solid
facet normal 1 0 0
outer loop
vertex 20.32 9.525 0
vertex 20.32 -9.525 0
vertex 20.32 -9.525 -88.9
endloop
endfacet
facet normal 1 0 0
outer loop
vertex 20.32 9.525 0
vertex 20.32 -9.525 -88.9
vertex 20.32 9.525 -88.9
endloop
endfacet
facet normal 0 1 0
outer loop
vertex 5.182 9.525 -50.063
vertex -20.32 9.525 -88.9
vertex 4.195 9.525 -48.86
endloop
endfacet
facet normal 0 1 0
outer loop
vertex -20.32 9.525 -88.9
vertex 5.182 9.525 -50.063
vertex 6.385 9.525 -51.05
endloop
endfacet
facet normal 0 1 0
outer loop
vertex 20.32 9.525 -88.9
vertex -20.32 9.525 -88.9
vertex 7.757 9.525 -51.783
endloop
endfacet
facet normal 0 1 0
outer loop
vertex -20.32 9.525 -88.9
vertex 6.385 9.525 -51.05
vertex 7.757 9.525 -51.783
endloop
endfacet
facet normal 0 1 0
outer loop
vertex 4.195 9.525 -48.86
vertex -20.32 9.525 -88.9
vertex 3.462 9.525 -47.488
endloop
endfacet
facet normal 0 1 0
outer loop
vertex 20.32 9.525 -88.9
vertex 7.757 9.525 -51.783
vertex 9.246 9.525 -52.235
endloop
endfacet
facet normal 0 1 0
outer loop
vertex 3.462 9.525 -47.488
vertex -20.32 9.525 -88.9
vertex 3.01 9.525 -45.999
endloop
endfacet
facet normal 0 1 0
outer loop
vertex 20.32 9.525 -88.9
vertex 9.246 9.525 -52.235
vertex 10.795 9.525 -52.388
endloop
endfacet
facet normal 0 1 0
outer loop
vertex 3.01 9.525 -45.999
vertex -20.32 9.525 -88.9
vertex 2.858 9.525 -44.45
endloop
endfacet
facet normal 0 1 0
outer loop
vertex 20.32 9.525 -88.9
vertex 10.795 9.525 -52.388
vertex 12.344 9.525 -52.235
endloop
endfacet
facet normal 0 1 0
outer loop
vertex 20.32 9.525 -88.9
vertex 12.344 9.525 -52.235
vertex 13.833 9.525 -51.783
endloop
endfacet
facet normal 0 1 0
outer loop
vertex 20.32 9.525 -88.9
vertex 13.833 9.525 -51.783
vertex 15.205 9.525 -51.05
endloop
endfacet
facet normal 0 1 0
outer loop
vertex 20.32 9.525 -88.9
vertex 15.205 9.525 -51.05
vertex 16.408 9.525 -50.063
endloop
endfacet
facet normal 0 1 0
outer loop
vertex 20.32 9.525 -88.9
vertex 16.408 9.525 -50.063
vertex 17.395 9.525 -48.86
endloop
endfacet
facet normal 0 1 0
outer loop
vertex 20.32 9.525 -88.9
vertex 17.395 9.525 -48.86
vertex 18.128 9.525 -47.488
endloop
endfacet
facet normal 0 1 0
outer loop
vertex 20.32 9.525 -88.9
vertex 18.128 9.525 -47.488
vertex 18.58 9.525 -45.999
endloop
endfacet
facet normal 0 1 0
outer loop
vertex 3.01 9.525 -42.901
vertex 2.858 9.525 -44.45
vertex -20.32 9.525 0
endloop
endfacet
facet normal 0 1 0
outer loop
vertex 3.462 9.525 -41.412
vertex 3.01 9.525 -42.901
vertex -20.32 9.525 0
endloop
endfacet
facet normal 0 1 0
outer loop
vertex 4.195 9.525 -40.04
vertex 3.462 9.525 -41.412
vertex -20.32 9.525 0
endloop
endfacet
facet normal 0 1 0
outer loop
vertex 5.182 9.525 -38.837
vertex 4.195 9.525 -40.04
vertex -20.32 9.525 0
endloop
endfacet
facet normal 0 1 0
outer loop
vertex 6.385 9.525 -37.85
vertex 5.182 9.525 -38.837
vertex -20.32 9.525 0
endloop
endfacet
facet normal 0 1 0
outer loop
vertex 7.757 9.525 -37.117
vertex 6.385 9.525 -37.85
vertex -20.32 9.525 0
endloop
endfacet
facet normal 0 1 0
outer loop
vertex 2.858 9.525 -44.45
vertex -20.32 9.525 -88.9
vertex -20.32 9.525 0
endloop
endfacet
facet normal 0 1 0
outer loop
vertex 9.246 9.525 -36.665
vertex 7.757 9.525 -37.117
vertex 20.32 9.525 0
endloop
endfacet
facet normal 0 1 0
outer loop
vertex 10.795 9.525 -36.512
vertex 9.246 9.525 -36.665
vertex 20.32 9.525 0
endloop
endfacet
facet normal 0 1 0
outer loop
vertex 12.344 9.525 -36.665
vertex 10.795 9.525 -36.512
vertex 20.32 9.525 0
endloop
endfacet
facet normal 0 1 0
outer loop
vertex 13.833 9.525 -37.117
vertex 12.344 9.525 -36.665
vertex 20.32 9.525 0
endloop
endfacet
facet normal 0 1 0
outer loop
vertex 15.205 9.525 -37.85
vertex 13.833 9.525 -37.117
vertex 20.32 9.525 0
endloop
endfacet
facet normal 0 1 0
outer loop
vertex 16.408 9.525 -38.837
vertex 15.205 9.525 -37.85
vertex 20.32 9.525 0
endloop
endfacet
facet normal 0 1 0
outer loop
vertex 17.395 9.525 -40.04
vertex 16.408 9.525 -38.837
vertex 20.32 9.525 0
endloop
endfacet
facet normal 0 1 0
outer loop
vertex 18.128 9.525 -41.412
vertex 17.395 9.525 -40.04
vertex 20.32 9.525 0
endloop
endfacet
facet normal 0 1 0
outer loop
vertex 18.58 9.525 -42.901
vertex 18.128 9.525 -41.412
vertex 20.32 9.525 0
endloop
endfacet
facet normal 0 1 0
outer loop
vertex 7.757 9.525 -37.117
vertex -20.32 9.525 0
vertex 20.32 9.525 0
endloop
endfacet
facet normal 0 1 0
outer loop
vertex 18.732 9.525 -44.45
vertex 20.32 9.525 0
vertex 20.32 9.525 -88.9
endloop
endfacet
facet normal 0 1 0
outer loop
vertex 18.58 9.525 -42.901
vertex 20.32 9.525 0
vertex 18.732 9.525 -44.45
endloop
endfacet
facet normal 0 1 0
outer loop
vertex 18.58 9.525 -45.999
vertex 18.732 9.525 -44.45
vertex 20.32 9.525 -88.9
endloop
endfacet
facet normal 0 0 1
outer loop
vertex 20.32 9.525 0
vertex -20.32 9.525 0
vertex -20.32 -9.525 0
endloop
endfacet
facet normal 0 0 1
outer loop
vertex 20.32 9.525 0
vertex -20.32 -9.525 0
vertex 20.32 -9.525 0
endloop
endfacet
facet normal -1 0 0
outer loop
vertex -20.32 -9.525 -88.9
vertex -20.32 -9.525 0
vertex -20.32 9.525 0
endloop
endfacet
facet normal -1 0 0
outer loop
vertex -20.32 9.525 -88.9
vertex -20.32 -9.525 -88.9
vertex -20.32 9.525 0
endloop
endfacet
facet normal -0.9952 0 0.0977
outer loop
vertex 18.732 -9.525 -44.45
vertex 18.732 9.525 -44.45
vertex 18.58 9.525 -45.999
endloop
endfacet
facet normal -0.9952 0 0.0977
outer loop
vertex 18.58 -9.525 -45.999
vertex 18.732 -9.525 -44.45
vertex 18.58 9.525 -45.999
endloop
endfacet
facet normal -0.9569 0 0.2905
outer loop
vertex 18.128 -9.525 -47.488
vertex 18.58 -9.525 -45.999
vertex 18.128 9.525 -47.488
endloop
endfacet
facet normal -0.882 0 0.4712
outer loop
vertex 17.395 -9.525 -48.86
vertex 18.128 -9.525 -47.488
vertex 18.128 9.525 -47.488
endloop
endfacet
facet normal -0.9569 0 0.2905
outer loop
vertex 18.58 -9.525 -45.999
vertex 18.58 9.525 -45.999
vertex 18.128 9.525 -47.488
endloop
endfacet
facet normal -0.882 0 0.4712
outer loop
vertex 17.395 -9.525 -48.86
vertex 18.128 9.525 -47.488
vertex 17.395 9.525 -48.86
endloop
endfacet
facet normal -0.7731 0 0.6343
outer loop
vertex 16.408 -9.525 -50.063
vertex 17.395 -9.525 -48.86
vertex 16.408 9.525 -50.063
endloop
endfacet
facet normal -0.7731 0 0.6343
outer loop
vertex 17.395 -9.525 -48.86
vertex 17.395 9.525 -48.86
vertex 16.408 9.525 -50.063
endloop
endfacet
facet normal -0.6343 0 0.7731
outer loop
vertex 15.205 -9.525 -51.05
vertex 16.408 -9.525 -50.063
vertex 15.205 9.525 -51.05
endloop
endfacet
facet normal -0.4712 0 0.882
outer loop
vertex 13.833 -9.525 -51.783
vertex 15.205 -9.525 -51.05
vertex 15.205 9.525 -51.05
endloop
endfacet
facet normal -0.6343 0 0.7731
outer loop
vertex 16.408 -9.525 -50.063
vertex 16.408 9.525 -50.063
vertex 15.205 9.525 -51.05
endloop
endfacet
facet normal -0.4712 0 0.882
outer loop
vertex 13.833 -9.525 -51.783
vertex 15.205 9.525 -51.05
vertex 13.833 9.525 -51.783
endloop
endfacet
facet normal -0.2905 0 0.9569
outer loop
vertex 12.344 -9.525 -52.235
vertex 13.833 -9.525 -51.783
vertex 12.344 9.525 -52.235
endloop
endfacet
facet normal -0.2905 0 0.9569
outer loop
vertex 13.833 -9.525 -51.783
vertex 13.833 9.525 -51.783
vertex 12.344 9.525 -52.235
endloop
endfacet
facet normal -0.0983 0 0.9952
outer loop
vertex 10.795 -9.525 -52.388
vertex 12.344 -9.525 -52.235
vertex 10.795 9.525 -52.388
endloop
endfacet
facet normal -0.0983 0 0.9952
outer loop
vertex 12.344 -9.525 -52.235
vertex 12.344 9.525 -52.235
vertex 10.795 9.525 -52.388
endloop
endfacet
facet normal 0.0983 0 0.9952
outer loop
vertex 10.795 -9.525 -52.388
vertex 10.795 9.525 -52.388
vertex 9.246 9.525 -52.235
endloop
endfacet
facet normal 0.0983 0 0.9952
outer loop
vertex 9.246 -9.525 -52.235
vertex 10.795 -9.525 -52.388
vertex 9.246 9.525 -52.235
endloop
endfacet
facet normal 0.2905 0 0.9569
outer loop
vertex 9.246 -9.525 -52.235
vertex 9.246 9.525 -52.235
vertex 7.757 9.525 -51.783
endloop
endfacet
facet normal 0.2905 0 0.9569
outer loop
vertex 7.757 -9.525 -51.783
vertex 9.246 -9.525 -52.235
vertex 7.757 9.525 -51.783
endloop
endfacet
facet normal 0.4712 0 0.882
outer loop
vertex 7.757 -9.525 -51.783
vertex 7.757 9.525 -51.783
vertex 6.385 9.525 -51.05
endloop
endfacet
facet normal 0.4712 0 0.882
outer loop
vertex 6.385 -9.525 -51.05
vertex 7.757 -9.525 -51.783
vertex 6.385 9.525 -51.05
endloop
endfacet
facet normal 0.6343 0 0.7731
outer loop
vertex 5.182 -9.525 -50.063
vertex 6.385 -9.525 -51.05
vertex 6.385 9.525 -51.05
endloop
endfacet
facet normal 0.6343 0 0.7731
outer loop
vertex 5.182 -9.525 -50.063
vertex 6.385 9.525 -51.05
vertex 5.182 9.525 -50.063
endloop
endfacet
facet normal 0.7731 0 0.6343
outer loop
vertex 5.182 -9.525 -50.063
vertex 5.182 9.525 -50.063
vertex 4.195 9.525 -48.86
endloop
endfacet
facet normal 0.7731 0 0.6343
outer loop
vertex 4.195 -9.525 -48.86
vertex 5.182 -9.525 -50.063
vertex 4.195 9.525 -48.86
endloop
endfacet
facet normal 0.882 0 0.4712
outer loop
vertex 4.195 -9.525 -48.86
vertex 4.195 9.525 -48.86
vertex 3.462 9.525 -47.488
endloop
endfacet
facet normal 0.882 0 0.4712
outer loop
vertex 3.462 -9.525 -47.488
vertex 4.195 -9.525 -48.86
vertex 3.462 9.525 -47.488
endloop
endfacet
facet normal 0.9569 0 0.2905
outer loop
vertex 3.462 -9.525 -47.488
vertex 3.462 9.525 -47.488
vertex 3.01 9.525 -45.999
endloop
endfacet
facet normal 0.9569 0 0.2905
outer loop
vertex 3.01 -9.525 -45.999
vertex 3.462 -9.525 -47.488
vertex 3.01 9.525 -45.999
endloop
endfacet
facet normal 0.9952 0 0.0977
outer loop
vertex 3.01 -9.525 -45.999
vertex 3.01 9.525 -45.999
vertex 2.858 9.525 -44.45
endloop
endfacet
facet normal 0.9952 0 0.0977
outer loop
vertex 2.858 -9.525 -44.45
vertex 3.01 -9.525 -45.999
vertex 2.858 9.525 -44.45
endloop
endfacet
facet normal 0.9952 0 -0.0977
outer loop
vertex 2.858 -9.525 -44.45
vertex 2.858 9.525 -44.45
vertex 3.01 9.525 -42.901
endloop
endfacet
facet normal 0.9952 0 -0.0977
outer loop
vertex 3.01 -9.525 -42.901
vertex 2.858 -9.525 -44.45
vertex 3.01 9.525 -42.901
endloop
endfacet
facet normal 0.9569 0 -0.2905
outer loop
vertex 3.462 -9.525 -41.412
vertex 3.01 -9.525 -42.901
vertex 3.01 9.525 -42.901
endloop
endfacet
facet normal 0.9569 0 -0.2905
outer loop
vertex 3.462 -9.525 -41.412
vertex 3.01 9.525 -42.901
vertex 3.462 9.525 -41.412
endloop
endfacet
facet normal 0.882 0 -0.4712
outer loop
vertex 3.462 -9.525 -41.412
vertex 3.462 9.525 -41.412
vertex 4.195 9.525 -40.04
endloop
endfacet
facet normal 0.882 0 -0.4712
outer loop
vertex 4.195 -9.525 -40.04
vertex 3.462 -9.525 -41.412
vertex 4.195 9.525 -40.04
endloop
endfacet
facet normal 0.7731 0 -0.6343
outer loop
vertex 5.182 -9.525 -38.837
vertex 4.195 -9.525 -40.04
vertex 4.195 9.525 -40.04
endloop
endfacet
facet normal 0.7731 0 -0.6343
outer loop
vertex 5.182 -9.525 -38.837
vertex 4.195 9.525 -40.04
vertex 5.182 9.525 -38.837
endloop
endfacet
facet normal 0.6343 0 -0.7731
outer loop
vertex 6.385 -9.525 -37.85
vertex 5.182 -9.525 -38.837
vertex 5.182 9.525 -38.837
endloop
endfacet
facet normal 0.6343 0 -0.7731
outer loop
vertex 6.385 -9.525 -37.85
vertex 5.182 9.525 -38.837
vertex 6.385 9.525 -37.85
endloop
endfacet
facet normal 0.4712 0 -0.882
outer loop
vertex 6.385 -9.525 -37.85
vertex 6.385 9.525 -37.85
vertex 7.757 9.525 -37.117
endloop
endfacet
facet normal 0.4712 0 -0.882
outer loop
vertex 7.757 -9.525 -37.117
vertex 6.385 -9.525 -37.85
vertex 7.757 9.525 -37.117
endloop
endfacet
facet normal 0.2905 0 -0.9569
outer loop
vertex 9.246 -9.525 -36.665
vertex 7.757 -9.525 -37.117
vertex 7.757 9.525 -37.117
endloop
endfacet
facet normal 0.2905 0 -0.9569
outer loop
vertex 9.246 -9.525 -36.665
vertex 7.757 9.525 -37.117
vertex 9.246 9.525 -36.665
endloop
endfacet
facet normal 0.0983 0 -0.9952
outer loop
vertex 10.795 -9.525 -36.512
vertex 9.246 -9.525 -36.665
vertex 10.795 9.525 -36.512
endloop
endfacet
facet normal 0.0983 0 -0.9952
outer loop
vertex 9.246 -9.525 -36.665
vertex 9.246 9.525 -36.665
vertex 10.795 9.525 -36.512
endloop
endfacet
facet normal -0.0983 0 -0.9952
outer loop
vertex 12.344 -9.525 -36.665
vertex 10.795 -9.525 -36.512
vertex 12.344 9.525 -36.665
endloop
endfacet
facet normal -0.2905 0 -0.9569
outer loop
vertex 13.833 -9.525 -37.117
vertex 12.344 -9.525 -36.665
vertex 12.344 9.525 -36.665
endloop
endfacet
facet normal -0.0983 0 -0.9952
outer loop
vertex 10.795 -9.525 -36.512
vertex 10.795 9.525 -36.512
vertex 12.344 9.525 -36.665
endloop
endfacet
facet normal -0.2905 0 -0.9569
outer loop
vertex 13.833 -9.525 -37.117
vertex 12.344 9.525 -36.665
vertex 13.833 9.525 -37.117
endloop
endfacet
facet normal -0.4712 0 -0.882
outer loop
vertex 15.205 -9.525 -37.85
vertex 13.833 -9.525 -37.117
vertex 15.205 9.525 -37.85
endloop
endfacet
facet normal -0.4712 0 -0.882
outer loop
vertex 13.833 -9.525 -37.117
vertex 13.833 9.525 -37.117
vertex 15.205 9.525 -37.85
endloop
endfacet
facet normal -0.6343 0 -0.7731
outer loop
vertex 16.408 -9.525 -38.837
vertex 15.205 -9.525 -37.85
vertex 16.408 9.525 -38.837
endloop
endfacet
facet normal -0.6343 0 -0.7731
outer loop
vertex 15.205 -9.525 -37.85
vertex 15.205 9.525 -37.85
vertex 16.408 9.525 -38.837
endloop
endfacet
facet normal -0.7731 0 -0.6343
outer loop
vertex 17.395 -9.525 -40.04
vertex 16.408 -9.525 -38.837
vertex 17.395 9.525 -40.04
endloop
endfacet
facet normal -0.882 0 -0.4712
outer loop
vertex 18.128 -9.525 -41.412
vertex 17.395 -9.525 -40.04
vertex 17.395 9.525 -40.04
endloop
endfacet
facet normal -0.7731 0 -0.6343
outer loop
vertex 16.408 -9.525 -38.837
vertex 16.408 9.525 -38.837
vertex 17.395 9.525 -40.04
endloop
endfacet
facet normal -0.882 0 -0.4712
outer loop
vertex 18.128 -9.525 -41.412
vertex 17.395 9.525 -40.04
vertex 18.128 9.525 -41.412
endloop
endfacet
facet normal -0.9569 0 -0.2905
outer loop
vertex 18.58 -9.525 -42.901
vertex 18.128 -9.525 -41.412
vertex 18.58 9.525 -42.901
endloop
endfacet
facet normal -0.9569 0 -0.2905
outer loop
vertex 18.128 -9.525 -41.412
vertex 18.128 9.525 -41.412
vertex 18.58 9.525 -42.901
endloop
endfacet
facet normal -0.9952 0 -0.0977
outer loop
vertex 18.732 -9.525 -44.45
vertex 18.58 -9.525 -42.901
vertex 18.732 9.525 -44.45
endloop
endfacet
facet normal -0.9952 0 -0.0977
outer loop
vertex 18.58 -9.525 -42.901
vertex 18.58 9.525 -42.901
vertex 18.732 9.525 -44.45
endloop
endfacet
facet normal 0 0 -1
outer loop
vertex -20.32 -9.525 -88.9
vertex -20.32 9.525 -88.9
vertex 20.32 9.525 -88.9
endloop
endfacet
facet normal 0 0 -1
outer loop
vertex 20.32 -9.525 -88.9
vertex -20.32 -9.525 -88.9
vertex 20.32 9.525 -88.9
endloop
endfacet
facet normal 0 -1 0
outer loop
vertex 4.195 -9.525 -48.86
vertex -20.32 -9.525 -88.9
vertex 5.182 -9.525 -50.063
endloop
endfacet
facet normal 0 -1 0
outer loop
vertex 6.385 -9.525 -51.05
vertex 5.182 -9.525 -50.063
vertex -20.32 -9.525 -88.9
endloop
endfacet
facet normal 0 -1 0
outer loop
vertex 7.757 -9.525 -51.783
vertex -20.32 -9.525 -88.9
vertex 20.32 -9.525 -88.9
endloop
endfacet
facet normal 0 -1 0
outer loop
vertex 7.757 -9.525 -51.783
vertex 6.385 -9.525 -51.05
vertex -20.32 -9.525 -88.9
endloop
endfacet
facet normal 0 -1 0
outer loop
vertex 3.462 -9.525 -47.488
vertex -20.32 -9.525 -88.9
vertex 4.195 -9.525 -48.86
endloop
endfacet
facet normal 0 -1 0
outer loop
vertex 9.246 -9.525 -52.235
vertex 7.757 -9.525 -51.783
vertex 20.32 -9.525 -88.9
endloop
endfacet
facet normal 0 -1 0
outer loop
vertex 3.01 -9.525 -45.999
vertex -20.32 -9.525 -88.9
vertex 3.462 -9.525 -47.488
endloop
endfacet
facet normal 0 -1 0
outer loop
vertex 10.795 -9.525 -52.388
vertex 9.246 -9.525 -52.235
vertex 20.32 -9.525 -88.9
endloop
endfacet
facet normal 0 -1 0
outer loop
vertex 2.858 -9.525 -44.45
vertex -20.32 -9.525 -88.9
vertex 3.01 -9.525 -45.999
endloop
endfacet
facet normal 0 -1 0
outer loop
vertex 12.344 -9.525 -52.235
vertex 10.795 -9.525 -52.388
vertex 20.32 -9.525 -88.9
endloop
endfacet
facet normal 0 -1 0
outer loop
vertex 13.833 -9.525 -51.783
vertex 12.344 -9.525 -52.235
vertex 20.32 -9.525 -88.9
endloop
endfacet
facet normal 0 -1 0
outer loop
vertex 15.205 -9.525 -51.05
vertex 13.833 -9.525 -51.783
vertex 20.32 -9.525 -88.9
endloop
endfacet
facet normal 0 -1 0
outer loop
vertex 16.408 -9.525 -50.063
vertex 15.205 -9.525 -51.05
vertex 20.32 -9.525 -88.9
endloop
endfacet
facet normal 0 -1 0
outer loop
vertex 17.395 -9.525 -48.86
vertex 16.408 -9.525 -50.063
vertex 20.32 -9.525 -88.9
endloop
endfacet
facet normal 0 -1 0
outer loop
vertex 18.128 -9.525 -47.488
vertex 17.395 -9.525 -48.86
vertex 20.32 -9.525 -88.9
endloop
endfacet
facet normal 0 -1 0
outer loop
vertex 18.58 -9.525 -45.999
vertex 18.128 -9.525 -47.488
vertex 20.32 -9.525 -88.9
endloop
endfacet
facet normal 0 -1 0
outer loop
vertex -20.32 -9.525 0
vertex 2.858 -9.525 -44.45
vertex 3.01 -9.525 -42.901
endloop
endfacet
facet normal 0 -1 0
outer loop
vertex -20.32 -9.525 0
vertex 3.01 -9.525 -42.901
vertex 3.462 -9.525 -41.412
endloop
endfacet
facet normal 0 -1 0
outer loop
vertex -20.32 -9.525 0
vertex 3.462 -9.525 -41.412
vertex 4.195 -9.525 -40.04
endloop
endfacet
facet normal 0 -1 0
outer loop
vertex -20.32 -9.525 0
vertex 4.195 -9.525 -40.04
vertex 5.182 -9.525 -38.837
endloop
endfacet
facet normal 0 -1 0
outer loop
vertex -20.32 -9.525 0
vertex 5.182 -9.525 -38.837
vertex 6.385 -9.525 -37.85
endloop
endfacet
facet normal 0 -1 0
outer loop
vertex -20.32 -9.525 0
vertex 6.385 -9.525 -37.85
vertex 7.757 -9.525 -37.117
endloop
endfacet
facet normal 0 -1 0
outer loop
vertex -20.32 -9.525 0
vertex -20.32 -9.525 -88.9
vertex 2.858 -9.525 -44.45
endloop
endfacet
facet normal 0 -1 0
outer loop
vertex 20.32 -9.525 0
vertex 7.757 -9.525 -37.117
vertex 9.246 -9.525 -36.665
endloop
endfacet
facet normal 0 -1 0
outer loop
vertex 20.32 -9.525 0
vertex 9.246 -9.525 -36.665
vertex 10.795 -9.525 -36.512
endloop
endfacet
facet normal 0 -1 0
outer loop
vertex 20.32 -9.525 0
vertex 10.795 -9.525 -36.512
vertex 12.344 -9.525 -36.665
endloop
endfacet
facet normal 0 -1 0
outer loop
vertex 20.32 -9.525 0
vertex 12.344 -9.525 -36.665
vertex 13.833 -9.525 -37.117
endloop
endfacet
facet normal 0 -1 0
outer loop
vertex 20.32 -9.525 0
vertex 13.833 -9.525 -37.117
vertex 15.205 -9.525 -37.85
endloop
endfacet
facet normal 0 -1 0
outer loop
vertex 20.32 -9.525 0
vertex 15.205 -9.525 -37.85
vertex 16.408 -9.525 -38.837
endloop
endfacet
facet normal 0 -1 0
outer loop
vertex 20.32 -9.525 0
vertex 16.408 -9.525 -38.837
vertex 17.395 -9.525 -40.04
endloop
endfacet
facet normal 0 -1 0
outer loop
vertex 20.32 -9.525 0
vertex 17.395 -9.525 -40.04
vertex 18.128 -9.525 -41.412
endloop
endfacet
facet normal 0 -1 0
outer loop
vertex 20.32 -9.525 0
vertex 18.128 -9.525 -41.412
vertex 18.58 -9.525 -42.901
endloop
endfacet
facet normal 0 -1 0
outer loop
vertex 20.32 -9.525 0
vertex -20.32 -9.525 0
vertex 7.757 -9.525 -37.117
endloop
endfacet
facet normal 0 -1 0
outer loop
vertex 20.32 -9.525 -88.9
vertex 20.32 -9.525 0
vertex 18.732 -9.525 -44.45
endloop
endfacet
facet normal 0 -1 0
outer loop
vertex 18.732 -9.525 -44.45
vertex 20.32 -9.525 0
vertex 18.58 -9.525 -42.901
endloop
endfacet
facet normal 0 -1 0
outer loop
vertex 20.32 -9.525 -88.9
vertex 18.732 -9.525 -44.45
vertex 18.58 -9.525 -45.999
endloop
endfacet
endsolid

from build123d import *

# Parameters (mm, degrees)
SKETCH1_W           = 40.64
SKETCH1_H           = 19.05
BOSS_EXTRUDE1_DEPTH = 88.9
SKETCH3_R           = 7.9375
CUT_EXTRUDE1_DEPTH  = 20.05


with BuildPart() as part:
    # Sketch1 → Boss-Extrude1 (new body)
    with BuildSketch(Plane.XY):
        Rectangle(SKETCH1_W, SKETCH1_H)
    extrude(amount=-BOSS_EXTRUDE1_DEPTH)

    # Sketch3 → Cut-Extrude1 (cut, through all)
    with BuildSketch(Plane(origin=(0, 9.525, 0), x_dir=(1, 0, 0), z_dir=(0, 1, 0))):
        with Locations((10.795, 44.45)):
            Circle(SKETCH3_R)
    extrude(amount=-CUT_EXTRUDE1_DEPTH, mode=Mode.SUBTRACT)


solid = part.part
